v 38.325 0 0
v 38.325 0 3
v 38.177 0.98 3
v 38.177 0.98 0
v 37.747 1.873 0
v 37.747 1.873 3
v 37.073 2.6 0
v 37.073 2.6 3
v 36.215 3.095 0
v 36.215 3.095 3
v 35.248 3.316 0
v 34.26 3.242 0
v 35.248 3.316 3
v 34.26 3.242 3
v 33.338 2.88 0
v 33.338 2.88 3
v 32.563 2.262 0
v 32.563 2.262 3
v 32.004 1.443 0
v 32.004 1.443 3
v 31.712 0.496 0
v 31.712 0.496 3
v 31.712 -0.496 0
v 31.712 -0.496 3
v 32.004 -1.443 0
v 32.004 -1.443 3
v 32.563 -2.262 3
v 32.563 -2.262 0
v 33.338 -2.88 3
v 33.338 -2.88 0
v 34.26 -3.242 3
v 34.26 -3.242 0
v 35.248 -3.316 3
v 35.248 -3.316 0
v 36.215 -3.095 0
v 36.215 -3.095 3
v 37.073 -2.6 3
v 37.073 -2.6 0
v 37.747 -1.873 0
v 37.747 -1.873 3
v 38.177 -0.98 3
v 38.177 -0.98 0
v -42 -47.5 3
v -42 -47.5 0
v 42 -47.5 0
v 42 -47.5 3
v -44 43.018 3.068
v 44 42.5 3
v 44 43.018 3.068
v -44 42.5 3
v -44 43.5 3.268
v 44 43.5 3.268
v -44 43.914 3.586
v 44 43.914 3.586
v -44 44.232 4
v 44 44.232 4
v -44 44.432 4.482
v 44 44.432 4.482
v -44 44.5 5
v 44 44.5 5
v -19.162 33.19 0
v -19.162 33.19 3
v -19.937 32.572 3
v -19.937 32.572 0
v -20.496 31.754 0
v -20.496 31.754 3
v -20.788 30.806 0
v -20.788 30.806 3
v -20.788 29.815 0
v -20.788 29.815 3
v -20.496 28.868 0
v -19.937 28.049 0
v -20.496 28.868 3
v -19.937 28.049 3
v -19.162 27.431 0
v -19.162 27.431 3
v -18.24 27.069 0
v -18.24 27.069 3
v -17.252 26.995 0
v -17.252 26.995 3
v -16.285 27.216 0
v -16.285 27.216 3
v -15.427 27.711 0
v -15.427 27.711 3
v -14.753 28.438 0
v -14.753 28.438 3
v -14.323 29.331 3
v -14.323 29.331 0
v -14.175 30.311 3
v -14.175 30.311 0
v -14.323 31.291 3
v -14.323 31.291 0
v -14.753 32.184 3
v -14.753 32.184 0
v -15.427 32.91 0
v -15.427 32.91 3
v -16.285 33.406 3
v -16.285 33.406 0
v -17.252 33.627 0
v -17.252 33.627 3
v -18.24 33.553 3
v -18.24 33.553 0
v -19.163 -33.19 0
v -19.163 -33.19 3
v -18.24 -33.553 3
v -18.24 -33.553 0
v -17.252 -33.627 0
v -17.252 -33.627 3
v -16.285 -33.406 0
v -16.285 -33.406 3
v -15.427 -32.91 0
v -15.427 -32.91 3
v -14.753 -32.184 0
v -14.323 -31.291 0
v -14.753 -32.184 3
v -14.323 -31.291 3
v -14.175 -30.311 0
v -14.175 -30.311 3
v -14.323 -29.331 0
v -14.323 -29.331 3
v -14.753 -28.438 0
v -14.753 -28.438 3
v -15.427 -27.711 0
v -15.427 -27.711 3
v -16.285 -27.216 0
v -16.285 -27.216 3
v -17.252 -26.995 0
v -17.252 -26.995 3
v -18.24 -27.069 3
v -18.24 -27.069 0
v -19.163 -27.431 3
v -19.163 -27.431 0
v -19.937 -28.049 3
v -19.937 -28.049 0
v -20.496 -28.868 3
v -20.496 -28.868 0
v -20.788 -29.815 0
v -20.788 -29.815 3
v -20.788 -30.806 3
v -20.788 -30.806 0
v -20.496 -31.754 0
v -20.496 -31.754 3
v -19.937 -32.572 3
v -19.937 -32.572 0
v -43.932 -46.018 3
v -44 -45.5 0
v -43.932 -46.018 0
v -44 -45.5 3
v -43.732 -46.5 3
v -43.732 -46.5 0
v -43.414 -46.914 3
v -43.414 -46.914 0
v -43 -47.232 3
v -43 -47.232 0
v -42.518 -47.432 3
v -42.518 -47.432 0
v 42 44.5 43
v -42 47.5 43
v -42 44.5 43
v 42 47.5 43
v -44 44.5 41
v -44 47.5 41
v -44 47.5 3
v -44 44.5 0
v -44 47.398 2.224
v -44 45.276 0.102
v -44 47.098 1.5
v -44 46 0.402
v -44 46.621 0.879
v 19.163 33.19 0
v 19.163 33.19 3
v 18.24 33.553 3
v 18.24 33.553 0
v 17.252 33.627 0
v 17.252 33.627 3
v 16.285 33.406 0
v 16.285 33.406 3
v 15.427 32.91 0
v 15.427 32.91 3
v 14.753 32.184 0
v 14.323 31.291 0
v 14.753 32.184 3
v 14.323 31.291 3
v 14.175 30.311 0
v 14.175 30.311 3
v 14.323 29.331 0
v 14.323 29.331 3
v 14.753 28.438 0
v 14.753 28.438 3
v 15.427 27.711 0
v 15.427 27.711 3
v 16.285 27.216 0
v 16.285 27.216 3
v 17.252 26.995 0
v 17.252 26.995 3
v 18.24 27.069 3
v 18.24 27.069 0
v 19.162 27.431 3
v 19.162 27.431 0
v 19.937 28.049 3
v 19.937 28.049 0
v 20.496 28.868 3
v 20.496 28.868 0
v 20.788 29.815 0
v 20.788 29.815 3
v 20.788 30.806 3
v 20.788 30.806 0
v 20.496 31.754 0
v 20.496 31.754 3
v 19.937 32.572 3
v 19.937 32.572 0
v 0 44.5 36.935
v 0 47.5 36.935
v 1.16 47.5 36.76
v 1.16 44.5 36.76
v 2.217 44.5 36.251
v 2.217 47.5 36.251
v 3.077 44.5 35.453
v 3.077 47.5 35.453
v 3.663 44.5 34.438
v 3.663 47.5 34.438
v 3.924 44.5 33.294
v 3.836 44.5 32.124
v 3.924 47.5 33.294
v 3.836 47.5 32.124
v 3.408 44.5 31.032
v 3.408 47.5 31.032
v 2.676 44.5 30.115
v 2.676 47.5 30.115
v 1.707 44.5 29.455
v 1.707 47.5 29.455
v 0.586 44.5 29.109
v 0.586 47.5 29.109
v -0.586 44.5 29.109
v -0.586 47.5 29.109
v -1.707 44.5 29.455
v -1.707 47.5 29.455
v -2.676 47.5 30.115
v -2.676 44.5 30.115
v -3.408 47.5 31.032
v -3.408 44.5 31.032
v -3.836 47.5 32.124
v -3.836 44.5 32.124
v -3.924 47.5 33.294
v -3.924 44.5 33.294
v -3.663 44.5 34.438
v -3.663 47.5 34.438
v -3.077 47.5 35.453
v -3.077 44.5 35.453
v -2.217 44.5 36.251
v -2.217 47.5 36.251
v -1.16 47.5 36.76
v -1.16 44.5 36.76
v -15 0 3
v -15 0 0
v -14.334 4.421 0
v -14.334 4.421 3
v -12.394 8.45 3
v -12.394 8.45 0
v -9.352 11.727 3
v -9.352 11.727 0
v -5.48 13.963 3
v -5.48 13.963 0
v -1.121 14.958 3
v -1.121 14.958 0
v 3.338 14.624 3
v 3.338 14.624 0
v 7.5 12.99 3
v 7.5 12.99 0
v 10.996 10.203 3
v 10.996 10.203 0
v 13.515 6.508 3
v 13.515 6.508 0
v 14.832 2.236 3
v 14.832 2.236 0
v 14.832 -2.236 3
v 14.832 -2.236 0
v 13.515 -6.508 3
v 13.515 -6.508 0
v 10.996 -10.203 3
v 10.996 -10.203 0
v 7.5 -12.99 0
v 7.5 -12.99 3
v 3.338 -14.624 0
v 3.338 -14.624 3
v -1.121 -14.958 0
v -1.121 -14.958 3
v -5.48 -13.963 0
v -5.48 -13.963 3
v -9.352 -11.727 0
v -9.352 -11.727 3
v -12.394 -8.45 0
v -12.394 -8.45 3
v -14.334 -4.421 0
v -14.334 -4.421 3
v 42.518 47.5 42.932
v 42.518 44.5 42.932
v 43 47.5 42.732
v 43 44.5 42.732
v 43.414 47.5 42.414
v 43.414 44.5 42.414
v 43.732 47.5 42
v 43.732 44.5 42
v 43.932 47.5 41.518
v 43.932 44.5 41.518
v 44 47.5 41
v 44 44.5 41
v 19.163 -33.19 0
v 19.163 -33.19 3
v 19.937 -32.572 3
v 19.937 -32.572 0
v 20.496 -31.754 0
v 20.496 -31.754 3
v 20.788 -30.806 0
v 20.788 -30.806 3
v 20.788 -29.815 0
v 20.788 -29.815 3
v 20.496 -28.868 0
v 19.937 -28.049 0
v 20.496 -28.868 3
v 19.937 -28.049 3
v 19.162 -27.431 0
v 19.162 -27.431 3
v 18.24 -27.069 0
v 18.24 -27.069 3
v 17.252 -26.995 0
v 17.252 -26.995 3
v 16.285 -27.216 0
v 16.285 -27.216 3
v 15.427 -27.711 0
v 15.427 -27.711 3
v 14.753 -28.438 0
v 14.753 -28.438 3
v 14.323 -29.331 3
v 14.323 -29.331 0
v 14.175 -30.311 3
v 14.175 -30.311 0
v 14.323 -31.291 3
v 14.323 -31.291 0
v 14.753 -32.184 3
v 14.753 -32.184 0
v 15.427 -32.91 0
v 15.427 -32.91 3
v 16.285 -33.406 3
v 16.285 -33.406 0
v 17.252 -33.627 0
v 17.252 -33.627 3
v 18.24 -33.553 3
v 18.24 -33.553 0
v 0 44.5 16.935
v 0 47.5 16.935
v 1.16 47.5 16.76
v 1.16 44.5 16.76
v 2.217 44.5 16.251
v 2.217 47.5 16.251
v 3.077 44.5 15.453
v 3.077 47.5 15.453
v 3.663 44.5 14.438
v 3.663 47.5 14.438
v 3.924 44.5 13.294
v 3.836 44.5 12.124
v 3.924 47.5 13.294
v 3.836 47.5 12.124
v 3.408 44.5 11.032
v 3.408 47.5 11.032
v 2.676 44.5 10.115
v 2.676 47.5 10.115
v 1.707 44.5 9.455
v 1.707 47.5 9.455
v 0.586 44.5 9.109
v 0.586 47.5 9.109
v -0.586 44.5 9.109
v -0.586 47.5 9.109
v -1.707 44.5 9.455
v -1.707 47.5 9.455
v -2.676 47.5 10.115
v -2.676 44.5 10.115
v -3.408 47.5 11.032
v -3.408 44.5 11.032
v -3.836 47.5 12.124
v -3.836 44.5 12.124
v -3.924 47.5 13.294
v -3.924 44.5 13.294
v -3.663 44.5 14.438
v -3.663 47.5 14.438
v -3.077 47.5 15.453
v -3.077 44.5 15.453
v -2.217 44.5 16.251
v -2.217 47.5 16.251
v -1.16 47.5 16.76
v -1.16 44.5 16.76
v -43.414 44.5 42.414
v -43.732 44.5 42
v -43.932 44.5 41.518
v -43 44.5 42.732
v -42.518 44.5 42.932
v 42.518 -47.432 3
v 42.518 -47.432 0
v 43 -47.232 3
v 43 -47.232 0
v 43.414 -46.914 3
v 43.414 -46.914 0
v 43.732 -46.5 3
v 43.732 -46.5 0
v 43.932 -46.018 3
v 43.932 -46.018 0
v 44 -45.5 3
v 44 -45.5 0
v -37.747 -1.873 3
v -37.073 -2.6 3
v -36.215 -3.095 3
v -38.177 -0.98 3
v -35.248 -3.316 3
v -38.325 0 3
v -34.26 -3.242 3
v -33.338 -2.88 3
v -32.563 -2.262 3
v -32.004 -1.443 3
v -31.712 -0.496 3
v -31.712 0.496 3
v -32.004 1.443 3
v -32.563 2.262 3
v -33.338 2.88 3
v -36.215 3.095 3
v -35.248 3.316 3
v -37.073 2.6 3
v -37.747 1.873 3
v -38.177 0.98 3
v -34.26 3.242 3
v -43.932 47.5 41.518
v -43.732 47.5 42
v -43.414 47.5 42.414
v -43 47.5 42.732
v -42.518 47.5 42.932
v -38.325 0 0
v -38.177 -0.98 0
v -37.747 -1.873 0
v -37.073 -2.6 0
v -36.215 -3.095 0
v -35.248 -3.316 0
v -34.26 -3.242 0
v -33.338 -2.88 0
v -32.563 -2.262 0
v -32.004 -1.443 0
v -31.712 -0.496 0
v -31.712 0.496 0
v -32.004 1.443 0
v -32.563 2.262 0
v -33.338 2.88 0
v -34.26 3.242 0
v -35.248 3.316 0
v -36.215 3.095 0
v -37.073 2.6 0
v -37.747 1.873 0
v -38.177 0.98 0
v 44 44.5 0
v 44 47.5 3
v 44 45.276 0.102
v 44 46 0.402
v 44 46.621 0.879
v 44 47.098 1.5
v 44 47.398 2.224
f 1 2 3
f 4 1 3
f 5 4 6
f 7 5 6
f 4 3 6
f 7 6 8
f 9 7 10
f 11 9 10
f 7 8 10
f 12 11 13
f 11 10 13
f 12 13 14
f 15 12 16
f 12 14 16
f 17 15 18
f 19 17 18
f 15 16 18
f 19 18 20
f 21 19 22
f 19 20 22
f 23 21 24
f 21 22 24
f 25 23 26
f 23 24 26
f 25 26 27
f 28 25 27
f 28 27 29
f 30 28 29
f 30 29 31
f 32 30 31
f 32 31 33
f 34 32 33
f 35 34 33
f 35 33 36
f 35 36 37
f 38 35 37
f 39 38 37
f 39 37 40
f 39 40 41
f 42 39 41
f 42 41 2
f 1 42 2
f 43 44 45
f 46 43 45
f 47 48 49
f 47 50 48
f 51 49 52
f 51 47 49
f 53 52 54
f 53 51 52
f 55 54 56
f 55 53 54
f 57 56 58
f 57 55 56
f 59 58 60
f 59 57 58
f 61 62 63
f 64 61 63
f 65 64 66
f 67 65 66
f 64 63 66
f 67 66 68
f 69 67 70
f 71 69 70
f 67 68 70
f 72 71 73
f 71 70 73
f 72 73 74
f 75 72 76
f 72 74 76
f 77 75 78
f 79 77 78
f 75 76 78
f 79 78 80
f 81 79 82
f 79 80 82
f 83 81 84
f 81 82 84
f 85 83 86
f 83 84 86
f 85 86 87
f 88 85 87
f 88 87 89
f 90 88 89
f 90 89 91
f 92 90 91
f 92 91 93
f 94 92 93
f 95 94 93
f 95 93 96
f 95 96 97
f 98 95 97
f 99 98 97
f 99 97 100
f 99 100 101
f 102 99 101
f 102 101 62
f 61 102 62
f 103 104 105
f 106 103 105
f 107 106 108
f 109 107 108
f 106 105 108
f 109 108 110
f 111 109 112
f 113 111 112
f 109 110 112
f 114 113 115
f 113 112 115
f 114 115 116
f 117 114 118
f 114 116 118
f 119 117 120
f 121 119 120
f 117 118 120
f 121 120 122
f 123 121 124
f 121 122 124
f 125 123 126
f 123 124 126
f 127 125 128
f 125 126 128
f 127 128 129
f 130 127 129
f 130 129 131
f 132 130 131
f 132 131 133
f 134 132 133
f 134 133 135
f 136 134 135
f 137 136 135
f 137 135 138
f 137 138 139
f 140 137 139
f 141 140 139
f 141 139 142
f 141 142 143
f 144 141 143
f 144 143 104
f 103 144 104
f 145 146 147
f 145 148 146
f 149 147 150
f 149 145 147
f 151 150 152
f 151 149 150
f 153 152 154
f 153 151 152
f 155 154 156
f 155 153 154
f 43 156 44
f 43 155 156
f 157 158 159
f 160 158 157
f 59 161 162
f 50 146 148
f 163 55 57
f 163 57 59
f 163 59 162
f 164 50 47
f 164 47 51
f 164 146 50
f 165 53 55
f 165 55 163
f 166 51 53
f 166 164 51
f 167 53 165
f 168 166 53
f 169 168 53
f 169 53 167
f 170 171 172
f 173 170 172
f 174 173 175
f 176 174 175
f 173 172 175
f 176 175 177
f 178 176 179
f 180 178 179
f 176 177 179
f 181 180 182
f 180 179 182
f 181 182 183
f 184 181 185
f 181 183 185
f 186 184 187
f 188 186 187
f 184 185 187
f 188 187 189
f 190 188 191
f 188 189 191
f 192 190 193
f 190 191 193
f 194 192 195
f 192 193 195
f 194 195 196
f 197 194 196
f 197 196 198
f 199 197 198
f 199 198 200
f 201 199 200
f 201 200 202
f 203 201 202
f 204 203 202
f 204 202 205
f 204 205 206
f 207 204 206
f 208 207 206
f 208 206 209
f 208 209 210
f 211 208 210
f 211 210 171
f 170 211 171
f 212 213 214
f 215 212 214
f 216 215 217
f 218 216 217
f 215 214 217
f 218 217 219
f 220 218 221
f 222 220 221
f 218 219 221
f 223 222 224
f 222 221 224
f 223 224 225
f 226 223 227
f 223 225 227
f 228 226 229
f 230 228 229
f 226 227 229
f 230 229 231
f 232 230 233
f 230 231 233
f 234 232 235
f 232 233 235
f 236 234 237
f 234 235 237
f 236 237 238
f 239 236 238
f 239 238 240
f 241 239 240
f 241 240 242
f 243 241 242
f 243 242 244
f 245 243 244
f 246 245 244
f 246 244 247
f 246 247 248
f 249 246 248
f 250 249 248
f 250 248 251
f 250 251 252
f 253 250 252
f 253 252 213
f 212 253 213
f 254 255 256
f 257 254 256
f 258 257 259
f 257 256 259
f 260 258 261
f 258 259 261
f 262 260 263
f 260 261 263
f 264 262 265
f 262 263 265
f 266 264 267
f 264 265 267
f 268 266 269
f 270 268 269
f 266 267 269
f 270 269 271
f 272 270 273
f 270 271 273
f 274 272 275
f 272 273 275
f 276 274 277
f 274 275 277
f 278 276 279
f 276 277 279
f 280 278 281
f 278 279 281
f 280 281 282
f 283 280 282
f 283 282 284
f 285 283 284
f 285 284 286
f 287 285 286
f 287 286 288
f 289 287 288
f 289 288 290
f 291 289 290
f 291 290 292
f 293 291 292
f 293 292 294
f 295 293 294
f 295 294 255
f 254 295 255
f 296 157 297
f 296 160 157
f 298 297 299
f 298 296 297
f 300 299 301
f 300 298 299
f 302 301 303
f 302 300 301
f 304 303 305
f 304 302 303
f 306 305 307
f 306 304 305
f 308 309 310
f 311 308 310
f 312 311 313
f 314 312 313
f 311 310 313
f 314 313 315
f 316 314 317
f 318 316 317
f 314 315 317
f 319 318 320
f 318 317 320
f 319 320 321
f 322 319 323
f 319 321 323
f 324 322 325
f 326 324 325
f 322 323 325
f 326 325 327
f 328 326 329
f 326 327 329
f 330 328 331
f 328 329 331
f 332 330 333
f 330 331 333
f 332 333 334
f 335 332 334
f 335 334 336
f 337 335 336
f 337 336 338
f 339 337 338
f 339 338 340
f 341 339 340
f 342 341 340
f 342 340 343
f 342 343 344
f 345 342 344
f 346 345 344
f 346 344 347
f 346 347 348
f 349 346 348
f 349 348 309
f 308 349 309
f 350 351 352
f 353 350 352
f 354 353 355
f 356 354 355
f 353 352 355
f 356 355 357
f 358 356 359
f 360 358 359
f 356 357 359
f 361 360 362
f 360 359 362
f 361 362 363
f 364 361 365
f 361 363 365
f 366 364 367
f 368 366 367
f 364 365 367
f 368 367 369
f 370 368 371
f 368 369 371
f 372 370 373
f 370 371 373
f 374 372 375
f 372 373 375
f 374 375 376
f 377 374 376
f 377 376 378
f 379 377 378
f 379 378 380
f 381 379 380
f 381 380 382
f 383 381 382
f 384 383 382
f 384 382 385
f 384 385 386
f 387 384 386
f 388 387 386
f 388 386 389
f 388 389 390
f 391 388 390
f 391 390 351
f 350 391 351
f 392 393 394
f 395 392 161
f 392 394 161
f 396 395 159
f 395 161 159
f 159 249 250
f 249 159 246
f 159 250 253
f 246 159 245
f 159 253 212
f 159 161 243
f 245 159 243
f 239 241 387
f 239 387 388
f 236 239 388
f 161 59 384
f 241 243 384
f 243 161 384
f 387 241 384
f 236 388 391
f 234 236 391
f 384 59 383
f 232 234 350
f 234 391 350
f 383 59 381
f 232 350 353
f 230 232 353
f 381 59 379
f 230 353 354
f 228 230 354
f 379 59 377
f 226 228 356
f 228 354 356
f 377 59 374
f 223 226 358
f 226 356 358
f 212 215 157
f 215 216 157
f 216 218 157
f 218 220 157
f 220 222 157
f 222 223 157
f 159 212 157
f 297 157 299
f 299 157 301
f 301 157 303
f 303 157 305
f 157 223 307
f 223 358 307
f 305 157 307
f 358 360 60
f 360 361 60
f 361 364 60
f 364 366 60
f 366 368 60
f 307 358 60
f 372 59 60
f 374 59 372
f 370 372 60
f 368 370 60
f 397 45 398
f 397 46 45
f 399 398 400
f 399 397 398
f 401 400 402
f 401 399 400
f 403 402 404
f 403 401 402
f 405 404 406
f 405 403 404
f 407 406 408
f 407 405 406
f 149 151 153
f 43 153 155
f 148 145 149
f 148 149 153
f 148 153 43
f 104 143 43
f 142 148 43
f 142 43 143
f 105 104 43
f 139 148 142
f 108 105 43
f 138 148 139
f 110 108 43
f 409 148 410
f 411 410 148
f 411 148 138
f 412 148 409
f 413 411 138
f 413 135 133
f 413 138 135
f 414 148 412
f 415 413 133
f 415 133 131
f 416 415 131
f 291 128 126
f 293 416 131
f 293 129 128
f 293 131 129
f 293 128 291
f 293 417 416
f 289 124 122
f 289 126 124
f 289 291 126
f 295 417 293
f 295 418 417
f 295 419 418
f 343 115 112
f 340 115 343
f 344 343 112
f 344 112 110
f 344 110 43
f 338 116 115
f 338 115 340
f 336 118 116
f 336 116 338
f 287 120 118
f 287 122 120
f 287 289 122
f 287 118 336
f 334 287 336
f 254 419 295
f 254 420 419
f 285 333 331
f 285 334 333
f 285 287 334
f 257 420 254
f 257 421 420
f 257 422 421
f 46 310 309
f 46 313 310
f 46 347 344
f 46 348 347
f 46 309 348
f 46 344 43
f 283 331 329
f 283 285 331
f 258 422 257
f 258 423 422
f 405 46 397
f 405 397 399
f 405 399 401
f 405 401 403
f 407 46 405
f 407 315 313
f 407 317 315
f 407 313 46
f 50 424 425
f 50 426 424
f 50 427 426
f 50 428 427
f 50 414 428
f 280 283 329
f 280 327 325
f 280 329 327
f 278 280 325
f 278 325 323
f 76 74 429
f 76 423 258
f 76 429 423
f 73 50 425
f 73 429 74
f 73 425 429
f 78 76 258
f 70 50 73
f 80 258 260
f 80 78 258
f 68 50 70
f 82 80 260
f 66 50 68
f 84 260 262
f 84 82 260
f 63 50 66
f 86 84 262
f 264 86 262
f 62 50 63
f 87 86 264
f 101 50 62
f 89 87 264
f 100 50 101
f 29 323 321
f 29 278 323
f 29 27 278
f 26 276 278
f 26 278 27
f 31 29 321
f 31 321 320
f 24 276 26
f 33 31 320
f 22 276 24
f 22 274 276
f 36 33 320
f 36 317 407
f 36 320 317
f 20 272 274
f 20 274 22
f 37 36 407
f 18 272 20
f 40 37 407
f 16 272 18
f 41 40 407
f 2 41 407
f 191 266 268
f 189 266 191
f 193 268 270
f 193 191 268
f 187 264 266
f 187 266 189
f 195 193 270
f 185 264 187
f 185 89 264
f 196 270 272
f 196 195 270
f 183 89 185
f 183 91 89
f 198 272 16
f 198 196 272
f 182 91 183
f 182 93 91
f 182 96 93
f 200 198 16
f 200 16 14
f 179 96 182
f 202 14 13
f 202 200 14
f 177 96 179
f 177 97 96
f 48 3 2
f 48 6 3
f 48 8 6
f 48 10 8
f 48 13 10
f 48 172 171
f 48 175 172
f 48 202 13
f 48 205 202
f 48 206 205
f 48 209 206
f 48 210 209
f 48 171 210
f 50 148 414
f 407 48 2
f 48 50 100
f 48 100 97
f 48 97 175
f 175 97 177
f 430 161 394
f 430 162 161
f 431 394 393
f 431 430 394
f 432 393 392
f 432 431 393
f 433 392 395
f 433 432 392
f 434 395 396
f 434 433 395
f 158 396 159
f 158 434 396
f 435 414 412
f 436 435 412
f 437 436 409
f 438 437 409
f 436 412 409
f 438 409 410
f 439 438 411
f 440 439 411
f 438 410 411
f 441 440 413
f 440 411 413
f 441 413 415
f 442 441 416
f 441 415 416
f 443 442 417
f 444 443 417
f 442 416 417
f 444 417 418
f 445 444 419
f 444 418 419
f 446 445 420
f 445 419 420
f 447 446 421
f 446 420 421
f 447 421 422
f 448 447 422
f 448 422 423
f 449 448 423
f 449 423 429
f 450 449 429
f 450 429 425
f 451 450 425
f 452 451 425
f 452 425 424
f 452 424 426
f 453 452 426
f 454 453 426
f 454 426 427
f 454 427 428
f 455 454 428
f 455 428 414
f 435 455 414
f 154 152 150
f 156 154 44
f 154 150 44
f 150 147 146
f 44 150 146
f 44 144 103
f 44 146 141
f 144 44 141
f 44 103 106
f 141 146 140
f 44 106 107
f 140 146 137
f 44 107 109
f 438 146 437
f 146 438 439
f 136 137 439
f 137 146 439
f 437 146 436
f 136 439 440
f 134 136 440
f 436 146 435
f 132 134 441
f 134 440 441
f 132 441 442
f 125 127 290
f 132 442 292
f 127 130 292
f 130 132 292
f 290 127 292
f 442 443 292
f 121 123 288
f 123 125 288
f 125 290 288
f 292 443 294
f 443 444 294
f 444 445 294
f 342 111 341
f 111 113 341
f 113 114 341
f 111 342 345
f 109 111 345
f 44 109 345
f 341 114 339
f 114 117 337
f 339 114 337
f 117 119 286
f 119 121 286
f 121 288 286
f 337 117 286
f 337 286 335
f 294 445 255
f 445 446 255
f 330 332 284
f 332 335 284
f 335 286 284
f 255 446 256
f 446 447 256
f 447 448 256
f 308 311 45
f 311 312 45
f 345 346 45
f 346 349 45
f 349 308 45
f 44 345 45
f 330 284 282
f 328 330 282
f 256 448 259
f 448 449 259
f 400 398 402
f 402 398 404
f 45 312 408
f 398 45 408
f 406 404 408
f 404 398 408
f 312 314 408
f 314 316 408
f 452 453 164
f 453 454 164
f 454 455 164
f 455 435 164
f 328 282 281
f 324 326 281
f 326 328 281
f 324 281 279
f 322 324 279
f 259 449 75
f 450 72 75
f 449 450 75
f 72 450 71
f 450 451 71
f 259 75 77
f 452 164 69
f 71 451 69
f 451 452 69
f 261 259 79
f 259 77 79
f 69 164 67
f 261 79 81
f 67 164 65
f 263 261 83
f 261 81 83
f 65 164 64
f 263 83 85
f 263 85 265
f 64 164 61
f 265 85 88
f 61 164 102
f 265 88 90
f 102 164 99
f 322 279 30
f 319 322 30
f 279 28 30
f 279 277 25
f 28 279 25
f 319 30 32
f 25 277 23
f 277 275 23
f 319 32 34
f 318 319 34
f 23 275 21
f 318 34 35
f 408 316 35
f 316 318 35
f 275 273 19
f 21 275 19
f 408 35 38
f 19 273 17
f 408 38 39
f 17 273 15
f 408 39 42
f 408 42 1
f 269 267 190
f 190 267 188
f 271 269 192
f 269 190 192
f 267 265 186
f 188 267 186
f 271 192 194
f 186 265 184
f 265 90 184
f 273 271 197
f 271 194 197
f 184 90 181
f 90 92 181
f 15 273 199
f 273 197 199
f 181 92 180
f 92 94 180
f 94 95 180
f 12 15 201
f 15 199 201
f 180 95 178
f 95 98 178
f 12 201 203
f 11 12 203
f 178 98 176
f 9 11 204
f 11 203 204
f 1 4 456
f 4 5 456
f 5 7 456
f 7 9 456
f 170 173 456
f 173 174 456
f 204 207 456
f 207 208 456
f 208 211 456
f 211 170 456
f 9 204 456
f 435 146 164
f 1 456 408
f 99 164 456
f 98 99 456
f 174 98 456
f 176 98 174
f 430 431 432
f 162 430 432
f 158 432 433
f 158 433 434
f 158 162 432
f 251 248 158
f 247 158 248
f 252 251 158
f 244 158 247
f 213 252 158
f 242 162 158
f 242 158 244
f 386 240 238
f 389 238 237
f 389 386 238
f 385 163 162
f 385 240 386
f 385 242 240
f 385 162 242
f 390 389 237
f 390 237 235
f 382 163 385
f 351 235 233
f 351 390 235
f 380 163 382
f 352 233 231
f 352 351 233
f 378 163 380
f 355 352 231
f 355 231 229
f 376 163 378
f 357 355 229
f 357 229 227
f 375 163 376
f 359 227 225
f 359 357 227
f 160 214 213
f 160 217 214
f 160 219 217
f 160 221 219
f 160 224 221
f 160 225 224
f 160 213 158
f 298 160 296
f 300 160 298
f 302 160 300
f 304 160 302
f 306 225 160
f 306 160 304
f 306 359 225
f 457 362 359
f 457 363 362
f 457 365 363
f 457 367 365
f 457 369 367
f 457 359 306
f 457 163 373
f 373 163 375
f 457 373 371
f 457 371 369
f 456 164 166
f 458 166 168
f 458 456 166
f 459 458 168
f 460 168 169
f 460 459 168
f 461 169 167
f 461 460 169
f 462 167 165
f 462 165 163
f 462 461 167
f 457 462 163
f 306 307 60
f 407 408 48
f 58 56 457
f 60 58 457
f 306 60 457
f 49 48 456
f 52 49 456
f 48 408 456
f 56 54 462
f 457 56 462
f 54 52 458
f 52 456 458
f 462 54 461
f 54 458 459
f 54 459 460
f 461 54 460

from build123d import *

# Parameters (mm, degrees)
SKETCH1_W                = 88
SKETCH1_H                = 95
BOSS_EXTRUDE1_DEPTH      = 3
BOSS_EXTRUDE2_DEPTH      = 40
BOSS_EXTRUDE2_DEPTH_BACK = 1
SKETCH2_W                = 88
SKETCH2_H                = 3
SKETCH3_R                = 15
CUT_EXTRUDE1_DEPTH       = 10
FILLET1_R                = 3
FILLET2_R                = 2
SKETCH5_R                = 3.935
CUT_EXTRUDE3_DEPTH       = 10
LPATTERN1_COUNT          = 2
LPATTERN1_PITCH          = 20
FILLET3_R                = 2
SKETCH6_R                = 3.325
CUT_EXTRUDE4_DEPTH       = 10
CIRPATTERN1_COUNT        = 6


with BuildPart() as part:
    # Sketch1 → Boss-Extrude1 (new body)
    with BuildSketch(Plane.XY):
        Rectangle(SKETCH1_W, SKETCH1_H)
    extrude(amount=BOSS_EXTRUDE1_DEPTH)

    # Sketch2 → Boss-Extrude2 (add, two sides: drawn at the far end of the back side and taken through both)
    with BuildSketch(Plane.XY.offset(3).offset(-BOSS_EXTRUDE2_DEPTH_BACK)):
        with Locations((0, 46)):
            Rectangle(SKETCH2_W, SKETCH2_H)
    extrude(amount=BOSS_EXTRUDE2_DEPTH + BOSS_EXTRUDE2_DEPTH_BACK)

    # Sketch3 → Cut-Extrude1 (cut)
    with BuildSketch(Plane(origin=(0, 0, 0), x_dir=(-1, 0, 0), z_dir=(0, 0, -1))):
        Circle(SKETCH3_R)
    extrude(amount=-CUT_EXTRUDE1_DEPTH, mode=Mode.SUBTRACT)

    # Fillet1
    fillet1_edges = [part.edges().sort_by_distance(p)[0] for p in [
        (0, 47.5, 0),
    ]]
    fillet(fillet1_edges, radius=FILLET1_R)

    # Fillet2
    fillet2_edges = [part.edges().sort_by_distance(p)[0] for p in [
        (0, 44.5, 3),
    ]]
    fillet(fillet2_edges, radius=FILLET2_R)

    # Sketch5 → Cut-Extrude3 (cut)
    with BuildSketch(Plane(origin=(0, 47.5, 0), x_dir=(1, 0, 0), z_dir=(0, 1, 0))):
        with Locations(Location((0, -13, 0), (0, 0, 270))):
            Circle(SKETCH5_R)
    cut_extrude3 = extrude(amount=-CUT_EXTRUDE3_DEPTH, mode=Mode.SUBTRACT)

    # LPattern1: Cut-Extrude3 ×2
    with Locations(*[(0, 0, i * LPATTERN1_PITCH) for i in range(1, LPATTERN1_COUNT)]):
        add(cut_extrude3, mode=Mode.SUBTRACT)

    # Fillet3
    fillet3_edges = [part.edges().sort_by_distance(p)[0] for p in [
        (-44, 46, 43),
        (44, 46, 43),
        (44, -47.5, 1.5),
        (-44, -47.5, 1.5),
    ]]
    fillet(fillet3_edges, radius=FILLET3_R)

    # Sketch6 → Cut-Extrude4 (cut)
    with BuildSketch(Plane.XY.offset(3)):
        with Locations((35, 0)):
            Circle(SKETCH6_R)
    cut_extrude4 = extrude(amount=-CUT_EXTRUDE4_DEPTH, mode=Mode.SUBTRACT)

    # CirPattern1: Cut-Extrude4 ×6 about axis
    cirpattern1_axis = Axis((0, 0, 0), (0, 0, 1))
    for i in range(1, CIRPATTERN1_COUNT):
        add(cut_extrude4.rotate(cirpattern1_axis, i * 360 / CIRPATTERN1_COUNT), mode=Mode.SUBTRACT)


solid = part.part
